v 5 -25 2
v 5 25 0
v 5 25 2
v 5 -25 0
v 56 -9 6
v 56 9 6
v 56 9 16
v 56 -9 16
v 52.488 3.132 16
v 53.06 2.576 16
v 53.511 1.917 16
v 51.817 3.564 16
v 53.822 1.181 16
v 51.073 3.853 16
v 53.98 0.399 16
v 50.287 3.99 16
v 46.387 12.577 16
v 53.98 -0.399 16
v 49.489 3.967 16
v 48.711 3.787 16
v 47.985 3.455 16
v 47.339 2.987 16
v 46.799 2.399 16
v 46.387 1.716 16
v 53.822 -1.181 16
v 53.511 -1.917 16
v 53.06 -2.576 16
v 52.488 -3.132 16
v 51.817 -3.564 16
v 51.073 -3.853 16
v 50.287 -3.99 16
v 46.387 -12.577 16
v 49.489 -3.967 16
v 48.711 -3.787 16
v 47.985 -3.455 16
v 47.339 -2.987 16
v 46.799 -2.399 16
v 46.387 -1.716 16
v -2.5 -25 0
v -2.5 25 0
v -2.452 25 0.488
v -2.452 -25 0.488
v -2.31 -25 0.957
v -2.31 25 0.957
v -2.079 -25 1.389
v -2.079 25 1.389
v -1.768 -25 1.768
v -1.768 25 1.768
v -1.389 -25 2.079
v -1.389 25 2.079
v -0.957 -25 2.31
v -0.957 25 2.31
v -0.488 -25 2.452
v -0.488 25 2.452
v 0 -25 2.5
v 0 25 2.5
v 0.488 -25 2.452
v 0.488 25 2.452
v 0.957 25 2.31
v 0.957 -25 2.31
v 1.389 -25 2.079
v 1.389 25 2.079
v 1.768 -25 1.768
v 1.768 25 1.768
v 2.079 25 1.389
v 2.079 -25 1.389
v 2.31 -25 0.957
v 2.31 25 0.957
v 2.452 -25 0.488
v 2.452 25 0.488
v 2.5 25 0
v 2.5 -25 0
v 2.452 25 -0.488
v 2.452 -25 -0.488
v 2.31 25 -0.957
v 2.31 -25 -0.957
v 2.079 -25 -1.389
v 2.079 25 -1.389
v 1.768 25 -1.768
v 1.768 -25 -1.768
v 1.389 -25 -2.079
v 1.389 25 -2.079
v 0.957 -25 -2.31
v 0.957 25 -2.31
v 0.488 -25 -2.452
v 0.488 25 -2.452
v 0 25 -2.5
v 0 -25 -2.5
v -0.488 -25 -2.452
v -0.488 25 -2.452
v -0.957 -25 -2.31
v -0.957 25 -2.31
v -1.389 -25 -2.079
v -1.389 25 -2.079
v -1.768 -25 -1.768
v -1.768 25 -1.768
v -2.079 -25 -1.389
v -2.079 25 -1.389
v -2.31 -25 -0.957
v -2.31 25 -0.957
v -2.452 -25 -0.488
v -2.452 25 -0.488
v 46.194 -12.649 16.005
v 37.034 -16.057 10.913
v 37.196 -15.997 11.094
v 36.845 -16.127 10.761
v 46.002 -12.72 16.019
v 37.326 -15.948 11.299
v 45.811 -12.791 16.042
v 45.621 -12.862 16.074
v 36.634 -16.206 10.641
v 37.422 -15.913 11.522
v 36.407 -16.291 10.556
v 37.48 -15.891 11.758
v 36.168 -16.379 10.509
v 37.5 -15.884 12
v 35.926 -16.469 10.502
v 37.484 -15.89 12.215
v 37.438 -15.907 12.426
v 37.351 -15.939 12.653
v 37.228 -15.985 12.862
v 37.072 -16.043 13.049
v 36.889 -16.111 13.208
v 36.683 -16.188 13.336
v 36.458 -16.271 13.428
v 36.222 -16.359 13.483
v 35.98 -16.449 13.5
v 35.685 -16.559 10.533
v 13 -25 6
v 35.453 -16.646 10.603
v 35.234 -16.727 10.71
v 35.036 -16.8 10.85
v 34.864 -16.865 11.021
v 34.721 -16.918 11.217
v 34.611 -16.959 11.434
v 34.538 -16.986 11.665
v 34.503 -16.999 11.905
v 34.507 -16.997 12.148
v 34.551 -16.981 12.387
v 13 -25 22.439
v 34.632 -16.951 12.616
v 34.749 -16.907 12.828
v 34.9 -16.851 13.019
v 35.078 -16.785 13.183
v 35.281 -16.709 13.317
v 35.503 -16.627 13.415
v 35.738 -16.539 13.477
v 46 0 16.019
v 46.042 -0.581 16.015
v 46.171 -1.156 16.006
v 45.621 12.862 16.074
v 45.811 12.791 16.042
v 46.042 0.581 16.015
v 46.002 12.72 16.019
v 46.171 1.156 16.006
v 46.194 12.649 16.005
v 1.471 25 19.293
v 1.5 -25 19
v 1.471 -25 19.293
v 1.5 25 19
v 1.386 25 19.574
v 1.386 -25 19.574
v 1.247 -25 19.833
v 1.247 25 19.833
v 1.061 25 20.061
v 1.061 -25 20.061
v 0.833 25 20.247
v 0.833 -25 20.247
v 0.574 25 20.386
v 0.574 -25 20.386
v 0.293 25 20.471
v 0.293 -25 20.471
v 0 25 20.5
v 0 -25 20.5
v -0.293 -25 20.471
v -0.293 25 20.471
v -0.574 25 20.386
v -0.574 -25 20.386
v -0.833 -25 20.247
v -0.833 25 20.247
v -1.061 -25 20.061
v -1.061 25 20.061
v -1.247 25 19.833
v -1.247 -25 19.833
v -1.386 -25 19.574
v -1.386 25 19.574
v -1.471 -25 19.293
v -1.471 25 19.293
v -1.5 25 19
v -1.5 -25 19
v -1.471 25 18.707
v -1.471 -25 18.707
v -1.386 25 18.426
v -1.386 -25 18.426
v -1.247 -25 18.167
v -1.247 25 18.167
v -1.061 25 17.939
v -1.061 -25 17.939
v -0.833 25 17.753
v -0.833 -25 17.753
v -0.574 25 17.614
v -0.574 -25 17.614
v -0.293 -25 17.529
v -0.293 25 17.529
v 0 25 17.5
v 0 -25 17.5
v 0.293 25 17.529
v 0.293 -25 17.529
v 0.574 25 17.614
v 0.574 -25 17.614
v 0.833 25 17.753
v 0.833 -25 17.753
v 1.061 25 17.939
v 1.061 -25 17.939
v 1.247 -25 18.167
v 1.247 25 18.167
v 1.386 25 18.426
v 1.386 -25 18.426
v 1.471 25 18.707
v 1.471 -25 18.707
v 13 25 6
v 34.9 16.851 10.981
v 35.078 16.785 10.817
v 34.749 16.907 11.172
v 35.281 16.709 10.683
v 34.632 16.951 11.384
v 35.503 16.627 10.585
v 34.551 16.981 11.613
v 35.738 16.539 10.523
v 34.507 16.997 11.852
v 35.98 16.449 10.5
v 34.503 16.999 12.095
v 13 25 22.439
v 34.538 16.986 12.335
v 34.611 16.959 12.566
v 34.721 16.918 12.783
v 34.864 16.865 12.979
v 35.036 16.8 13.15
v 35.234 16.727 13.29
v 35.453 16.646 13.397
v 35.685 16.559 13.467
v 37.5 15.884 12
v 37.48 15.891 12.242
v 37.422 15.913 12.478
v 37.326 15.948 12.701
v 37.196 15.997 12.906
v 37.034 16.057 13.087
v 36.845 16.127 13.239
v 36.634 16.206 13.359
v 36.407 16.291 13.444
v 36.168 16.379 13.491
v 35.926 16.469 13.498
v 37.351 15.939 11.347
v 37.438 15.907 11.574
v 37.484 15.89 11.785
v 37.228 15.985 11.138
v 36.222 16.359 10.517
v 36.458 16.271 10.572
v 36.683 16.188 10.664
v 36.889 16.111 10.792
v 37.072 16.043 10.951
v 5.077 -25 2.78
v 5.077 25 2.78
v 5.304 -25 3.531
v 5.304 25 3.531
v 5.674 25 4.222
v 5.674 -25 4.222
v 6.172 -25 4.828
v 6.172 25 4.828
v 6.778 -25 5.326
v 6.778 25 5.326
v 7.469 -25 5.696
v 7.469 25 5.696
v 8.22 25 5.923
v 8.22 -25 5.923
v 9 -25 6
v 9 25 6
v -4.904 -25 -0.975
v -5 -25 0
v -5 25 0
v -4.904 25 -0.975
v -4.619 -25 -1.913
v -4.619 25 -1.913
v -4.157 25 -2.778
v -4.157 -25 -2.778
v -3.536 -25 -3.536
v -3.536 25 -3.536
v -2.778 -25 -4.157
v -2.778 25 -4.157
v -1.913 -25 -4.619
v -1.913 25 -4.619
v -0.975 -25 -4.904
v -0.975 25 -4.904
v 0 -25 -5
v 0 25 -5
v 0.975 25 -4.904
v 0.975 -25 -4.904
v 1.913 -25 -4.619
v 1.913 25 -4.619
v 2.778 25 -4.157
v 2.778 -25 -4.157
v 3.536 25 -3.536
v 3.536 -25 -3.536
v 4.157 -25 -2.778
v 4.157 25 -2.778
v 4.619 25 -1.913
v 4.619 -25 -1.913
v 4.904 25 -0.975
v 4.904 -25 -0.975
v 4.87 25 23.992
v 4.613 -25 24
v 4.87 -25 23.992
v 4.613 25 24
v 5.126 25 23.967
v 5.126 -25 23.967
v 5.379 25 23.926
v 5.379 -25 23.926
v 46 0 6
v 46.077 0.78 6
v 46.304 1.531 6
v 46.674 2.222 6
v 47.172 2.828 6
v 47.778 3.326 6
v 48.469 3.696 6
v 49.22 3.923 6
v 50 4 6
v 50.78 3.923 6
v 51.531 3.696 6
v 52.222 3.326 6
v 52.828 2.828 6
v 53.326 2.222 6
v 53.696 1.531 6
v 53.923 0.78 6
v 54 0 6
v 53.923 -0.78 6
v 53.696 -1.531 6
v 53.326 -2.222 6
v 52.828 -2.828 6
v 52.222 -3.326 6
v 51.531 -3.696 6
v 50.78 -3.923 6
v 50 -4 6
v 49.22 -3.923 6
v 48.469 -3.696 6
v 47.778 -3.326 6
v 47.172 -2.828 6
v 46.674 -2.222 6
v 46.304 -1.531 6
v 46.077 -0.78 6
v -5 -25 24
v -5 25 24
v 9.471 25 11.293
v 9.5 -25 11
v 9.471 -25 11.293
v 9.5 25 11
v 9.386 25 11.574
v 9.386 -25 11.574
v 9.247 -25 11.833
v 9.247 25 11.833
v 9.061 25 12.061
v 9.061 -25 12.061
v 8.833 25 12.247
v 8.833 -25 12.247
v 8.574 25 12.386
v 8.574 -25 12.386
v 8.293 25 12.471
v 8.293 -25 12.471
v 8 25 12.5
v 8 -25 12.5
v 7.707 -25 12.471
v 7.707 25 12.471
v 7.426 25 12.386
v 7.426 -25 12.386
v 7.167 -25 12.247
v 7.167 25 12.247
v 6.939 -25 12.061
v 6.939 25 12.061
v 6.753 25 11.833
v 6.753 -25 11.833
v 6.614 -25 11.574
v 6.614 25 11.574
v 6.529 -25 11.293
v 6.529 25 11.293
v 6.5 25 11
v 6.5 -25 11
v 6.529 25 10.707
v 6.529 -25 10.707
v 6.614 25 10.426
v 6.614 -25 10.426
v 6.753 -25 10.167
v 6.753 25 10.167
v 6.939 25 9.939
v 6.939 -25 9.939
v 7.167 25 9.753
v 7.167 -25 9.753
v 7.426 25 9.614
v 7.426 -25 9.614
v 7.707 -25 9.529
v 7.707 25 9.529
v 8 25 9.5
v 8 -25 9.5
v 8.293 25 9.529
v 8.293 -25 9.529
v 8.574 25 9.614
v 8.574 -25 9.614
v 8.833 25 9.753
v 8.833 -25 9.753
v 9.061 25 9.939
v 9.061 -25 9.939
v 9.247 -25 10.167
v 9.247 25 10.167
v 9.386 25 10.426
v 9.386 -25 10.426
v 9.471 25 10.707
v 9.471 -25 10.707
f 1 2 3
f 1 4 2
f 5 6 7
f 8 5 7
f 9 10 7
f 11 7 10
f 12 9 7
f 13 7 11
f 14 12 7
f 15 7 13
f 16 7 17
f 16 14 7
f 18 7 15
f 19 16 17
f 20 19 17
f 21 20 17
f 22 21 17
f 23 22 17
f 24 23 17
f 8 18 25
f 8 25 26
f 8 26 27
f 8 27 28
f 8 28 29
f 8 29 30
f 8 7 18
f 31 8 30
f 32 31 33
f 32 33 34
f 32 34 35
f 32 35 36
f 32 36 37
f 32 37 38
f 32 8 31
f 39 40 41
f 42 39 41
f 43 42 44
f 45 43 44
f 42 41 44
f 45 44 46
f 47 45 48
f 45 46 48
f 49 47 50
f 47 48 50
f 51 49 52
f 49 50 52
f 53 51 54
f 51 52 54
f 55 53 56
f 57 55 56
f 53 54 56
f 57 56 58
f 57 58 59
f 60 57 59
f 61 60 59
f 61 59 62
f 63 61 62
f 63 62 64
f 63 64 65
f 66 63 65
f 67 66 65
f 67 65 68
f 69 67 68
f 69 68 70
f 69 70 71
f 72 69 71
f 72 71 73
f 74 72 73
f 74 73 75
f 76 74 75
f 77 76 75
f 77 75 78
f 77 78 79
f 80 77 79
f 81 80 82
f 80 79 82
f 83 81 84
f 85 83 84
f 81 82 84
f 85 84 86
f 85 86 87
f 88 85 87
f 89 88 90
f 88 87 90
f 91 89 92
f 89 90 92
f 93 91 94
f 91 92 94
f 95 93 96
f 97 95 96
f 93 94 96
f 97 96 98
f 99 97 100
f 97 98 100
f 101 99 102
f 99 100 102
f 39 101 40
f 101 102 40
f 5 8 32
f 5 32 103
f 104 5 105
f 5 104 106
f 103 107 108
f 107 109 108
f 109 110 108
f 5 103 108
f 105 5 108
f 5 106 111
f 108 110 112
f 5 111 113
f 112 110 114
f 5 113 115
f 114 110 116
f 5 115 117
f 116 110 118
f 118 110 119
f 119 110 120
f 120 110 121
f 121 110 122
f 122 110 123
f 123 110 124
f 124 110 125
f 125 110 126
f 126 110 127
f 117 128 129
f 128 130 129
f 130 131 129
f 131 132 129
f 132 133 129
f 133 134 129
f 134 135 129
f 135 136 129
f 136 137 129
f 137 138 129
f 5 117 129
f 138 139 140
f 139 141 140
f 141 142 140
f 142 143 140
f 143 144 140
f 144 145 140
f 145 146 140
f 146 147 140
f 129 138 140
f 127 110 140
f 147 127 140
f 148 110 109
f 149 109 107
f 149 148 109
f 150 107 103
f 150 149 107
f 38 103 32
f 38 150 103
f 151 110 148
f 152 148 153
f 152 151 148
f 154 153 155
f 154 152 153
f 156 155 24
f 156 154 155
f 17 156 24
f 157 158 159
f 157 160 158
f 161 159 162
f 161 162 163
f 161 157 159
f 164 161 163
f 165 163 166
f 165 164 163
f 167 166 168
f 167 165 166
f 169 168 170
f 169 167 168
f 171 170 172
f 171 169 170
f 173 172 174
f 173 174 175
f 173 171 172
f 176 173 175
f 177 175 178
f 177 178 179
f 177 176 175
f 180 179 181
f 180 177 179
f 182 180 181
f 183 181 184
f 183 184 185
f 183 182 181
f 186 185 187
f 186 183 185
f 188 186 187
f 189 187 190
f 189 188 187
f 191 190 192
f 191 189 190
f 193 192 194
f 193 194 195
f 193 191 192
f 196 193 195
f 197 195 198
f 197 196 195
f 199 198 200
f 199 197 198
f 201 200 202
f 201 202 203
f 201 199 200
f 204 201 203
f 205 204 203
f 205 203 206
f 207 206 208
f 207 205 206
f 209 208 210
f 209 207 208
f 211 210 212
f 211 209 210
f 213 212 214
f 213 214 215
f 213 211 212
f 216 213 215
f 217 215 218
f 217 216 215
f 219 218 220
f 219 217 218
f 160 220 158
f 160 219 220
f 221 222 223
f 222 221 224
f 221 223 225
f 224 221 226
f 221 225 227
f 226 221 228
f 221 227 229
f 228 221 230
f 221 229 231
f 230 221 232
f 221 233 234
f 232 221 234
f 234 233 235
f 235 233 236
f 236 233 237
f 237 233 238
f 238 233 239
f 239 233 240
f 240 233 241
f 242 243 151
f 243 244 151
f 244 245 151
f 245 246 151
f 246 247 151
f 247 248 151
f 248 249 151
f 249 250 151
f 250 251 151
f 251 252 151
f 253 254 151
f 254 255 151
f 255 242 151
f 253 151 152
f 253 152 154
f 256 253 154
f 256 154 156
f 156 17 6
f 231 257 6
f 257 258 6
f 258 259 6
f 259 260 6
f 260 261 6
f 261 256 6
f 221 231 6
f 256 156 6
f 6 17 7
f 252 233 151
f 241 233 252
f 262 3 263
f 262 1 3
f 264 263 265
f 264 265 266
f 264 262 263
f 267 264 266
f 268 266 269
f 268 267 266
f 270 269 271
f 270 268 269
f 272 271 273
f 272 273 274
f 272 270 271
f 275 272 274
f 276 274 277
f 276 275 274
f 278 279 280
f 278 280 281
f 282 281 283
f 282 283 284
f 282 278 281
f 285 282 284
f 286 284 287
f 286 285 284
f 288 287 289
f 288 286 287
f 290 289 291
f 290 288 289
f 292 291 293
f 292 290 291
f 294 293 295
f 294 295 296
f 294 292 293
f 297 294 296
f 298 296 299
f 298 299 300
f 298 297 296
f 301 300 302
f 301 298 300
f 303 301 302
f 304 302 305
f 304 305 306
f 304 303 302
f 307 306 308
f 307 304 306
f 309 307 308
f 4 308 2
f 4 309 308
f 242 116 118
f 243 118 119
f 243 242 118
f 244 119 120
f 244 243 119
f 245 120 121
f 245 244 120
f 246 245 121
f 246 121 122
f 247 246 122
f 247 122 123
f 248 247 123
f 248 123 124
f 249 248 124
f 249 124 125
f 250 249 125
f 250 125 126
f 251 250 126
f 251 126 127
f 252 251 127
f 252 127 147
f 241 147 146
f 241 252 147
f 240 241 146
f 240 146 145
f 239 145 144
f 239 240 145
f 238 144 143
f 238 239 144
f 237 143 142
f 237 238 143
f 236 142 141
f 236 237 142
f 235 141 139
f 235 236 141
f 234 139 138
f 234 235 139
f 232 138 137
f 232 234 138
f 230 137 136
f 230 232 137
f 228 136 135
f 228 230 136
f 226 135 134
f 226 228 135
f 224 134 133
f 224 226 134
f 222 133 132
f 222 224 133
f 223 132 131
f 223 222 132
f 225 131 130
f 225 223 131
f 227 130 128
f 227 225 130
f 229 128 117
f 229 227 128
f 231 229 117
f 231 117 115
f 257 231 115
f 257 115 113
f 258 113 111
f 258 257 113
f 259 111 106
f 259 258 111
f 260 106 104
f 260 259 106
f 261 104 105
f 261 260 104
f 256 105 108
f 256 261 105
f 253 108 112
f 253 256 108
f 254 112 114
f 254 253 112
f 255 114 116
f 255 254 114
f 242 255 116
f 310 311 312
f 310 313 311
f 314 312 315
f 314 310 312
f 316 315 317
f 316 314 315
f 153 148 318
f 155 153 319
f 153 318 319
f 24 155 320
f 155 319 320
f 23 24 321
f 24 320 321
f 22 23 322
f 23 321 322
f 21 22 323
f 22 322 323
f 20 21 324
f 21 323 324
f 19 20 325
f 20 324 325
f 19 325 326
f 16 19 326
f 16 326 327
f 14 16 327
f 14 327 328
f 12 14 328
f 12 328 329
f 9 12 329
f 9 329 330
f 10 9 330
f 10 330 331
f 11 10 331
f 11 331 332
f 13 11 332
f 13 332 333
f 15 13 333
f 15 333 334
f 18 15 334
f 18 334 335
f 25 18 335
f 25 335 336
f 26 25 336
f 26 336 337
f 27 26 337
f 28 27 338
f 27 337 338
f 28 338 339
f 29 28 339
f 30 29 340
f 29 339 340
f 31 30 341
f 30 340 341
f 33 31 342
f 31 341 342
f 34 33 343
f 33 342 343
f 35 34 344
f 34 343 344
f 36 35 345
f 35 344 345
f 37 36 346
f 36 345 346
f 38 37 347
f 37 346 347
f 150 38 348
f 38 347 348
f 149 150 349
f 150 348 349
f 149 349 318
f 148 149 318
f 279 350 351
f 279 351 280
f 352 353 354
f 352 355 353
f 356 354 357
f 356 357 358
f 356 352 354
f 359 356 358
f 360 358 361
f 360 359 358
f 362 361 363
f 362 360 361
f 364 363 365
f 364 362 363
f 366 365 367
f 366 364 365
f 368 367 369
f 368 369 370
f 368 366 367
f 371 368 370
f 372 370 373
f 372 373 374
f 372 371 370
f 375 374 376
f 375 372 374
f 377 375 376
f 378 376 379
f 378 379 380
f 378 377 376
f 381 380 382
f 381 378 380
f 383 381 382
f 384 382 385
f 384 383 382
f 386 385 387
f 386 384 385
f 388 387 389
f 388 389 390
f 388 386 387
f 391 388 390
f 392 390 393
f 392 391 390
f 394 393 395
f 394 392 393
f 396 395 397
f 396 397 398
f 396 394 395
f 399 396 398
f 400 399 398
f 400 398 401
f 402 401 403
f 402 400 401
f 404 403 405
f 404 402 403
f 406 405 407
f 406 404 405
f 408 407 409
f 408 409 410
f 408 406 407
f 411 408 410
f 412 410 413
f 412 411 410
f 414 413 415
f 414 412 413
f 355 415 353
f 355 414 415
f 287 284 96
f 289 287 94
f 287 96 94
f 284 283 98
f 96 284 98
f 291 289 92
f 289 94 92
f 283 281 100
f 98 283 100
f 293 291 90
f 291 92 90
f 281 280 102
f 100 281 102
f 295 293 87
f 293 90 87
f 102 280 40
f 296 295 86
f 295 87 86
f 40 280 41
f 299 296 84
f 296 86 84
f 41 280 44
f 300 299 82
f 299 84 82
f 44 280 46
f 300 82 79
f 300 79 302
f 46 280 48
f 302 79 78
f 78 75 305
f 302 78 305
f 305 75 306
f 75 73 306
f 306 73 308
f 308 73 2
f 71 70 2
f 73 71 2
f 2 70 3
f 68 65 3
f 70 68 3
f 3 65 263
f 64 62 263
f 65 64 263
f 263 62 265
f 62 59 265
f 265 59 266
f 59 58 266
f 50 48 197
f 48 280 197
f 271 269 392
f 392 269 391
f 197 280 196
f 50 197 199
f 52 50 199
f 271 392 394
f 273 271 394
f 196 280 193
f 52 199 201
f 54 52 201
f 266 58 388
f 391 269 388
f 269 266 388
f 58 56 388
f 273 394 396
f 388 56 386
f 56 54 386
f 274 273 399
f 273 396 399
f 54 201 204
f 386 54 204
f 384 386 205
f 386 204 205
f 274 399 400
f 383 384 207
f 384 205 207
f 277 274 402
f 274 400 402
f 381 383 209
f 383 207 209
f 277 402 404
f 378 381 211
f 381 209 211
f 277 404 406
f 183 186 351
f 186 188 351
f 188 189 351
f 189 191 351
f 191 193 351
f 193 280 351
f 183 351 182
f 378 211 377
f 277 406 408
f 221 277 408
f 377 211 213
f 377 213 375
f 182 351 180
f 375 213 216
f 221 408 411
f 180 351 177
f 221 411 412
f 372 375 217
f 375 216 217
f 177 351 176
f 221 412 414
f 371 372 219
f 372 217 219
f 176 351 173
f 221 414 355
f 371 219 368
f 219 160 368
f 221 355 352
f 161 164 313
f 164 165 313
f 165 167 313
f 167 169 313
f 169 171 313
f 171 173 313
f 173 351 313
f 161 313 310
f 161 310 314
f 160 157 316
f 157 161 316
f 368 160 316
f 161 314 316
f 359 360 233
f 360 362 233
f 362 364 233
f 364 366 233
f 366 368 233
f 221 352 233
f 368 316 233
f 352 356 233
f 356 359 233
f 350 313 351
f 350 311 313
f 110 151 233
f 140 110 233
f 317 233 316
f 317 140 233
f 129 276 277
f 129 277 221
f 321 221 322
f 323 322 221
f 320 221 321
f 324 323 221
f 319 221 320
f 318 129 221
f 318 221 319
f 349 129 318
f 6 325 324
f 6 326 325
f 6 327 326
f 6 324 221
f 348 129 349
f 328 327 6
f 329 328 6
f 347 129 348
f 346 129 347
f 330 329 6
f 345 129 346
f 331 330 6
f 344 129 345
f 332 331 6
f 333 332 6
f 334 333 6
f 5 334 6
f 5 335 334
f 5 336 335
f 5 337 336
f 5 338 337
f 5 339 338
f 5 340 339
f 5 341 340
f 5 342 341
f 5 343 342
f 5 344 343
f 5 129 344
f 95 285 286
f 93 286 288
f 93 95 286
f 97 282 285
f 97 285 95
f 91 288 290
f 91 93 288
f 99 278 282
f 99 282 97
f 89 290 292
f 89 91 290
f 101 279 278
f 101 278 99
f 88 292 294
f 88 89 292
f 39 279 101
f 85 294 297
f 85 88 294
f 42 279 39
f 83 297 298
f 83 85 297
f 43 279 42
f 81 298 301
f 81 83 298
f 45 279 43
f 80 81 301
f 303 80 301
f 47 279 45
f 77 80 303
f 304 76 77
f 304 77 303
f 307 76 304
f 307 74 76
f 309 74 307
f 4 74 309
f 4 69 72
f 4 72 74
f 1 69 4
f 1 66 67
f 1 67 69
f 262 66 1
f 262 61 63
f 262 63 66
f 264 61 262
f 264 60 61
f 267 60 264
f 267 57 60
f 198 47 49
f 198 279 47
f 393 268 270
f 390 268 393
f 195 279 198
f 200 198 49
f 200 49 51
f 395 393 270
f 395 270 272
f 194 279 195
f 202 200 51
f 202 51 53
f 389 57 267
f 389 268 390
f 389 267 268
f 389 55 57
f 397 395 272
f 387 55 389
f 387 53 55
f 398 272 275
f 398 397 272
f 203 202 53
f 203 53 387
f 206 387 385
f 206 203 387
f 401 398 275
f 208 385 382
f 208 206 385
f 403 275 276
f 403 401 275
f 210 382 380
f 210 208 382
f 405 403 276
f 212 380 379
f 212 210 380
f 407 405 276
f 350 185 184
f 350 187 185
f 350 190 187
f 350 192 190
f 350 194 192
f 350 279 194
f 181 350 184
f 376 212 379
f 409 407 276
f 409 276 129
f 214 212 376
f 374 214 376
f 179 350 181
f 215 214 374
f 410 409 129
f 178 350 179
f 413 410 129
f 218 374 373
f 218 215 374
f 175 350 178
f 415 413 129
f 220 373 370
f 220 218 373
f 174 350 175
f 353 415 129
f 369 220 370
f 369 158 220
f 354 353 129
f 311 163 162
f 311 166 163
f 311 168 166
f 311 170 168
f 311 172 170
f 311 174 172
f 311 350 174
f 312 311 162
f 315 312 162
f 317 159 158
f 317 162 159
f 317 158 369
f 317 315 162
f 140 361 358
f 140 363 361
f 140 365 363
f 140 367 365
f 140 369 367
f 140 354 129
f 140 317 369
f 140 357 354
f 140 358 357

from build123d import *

# Parameters (mm, degrees)
F0_R     = 1.5
F1_DEPTH = 25
F3_D     = 5
F4_R     = 4
F6_D     = 8
F8_DEPTH = 29.001


with BuildPart() as f1:
    # F0 (on Front) → F1 (new body, symmetric)
    with BuildSketch(Plane.XZ):
        with BuildLine():
            Line((5, 24), (-5, 24))
            Line((-5, 24), (-5, 0))
            ThreePointArc((-5, 0), (0, -5), (5, 0))
            Line((5, 0), (5, 6))
            Line((5, 6), (56, 6))
            Line((56, 6), (56, 16))
            Line((56, 16), (46, 16))
            Line((46, 16), (5, 24))
        make_face()
        with Locations((8, 11)):
            Circle(F0_R, mode=Mode.SUBTRACT)
        with Locations((0, 19)):
            Circle(F0_R, mode=Mode.SUBTRACT)
        with Locations((36, 12)):
            Circle(F0_R, mode=Mode.SUBTRACT)
    extrude(amount=F1_DEPTH, both=True)

    # F3 (through all)
    with Locations(Plane.XZ.offset(25)):
        with Locations((0, 0)):
            Hole(F3_D / 2)

    # F4
    f4_edges = [f1.edges().sort_by_distance(p)[0] for p in [
        (5, 0, 6),
        (5, 0, 24),
        (46, 0, 16),
    ]]
    fillet(f4_edges, radius=F4_R)

    # F6 (through all)
    with Locations(Plane.XY.offset(24)):
        with Locations((50, 0)):
            Hole(F6_D / 2)

    # F7 (on face) → F8 (cut, through all)
    with BuildSketch(Plane.XY.offset(24)):
        Polygon((13, 45), (13, 25), (56, 9), (56, -9), (13, -25), (13, -45), (76, -45), (76, 45), align=None)
    extrude(amount=-F8_DEPTH, mode=Mode.SUBTRACT)


solid = f1.part
